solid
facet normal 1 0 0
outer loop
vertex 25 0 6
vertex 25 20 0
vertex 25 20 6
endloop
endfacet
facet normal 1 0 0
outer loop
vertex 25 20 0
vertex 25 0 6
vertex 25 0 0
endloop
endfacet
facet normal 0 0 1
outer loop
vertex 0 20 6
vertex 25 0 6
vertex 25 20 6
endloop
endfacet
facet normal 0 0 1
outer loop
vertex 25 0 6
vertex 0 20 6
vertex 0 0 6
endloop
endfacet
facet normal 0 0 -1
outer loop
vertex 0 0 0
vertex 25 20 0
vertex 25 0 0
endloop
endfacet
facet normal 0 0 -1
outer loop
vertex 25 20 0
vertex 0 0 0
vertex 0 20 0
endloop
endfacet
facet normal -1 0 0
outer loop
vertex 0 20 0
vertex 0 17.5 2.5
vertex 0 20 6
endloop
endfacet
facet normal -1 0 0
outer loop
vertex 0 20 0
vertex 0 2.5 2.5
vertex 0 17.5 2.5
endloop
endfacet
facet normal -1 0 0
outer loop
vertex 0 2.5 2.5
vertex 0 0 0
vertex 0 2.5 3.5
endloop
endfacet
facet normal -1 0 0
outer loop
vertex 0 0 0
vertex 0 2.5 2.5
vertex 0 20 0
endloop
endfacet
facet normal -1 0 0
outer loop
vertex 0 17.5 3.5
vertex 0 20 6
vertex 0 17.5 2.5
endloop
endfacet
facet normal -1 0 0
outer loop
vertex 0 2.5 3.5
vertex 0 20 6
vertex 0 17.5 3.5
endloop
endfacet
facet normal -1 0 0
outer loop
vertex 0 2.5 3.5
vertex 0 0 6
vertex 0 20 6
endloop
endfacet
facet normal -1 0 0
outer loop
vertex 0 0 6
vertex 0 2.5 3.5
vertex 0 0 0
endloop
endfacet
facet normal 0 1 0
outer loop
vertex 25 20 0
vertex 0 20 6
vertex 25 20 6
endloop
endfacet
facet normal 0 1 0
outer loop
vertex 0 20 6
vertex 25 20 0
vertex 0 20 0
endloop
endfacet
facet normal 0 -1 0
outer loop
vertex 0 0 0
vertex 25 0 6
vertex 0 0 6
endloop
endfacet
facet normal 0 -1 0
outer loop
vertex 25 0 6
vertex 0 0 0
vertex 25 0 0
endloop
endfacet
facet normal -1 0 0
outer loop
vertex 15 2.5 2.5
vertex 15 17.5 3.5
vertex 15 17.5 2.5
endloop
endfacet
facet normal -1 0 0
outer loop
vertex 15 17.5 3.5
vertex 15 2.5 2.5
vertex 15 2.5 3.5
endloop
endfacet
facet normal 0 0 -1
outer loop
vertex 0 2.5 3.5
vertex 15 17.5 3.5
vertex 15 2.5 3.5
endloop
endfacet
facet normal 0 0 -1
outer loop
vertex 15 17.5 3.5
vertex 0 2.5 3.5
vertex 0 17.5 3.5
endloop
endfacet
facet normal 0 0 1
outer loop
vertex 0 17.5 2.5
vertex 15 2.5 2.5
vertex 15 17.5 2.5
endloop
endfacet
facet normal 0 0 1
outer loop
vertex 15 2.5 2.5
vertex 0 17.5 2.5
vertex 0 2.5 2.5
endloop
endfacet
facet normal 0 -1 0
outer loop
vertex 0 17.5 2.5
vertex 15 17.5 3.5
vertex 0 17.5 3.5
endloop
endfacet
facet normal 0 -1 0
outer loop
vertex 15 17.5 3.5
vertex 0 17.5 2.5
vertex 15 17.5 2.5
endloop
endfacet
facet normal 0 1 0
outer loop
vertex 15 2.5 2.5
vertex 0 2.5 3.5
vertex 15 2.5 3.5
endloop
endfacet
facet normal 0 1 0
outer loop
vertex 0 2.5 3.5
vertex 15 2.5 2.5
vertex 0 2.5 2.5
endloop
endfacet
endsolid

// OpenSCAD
    difference() {
    difference() {
     union() {
        translate([0, 0, 0])
        cube(size=[25, 20, 6]);
    }
        translate([0, 2.5, 2.5])
        cube(size=[15, 15, 1]);
    } 
    
    
}
 translate([17, 0, 1.5])
        cube(size=[1, 20, 0.5]);
  
